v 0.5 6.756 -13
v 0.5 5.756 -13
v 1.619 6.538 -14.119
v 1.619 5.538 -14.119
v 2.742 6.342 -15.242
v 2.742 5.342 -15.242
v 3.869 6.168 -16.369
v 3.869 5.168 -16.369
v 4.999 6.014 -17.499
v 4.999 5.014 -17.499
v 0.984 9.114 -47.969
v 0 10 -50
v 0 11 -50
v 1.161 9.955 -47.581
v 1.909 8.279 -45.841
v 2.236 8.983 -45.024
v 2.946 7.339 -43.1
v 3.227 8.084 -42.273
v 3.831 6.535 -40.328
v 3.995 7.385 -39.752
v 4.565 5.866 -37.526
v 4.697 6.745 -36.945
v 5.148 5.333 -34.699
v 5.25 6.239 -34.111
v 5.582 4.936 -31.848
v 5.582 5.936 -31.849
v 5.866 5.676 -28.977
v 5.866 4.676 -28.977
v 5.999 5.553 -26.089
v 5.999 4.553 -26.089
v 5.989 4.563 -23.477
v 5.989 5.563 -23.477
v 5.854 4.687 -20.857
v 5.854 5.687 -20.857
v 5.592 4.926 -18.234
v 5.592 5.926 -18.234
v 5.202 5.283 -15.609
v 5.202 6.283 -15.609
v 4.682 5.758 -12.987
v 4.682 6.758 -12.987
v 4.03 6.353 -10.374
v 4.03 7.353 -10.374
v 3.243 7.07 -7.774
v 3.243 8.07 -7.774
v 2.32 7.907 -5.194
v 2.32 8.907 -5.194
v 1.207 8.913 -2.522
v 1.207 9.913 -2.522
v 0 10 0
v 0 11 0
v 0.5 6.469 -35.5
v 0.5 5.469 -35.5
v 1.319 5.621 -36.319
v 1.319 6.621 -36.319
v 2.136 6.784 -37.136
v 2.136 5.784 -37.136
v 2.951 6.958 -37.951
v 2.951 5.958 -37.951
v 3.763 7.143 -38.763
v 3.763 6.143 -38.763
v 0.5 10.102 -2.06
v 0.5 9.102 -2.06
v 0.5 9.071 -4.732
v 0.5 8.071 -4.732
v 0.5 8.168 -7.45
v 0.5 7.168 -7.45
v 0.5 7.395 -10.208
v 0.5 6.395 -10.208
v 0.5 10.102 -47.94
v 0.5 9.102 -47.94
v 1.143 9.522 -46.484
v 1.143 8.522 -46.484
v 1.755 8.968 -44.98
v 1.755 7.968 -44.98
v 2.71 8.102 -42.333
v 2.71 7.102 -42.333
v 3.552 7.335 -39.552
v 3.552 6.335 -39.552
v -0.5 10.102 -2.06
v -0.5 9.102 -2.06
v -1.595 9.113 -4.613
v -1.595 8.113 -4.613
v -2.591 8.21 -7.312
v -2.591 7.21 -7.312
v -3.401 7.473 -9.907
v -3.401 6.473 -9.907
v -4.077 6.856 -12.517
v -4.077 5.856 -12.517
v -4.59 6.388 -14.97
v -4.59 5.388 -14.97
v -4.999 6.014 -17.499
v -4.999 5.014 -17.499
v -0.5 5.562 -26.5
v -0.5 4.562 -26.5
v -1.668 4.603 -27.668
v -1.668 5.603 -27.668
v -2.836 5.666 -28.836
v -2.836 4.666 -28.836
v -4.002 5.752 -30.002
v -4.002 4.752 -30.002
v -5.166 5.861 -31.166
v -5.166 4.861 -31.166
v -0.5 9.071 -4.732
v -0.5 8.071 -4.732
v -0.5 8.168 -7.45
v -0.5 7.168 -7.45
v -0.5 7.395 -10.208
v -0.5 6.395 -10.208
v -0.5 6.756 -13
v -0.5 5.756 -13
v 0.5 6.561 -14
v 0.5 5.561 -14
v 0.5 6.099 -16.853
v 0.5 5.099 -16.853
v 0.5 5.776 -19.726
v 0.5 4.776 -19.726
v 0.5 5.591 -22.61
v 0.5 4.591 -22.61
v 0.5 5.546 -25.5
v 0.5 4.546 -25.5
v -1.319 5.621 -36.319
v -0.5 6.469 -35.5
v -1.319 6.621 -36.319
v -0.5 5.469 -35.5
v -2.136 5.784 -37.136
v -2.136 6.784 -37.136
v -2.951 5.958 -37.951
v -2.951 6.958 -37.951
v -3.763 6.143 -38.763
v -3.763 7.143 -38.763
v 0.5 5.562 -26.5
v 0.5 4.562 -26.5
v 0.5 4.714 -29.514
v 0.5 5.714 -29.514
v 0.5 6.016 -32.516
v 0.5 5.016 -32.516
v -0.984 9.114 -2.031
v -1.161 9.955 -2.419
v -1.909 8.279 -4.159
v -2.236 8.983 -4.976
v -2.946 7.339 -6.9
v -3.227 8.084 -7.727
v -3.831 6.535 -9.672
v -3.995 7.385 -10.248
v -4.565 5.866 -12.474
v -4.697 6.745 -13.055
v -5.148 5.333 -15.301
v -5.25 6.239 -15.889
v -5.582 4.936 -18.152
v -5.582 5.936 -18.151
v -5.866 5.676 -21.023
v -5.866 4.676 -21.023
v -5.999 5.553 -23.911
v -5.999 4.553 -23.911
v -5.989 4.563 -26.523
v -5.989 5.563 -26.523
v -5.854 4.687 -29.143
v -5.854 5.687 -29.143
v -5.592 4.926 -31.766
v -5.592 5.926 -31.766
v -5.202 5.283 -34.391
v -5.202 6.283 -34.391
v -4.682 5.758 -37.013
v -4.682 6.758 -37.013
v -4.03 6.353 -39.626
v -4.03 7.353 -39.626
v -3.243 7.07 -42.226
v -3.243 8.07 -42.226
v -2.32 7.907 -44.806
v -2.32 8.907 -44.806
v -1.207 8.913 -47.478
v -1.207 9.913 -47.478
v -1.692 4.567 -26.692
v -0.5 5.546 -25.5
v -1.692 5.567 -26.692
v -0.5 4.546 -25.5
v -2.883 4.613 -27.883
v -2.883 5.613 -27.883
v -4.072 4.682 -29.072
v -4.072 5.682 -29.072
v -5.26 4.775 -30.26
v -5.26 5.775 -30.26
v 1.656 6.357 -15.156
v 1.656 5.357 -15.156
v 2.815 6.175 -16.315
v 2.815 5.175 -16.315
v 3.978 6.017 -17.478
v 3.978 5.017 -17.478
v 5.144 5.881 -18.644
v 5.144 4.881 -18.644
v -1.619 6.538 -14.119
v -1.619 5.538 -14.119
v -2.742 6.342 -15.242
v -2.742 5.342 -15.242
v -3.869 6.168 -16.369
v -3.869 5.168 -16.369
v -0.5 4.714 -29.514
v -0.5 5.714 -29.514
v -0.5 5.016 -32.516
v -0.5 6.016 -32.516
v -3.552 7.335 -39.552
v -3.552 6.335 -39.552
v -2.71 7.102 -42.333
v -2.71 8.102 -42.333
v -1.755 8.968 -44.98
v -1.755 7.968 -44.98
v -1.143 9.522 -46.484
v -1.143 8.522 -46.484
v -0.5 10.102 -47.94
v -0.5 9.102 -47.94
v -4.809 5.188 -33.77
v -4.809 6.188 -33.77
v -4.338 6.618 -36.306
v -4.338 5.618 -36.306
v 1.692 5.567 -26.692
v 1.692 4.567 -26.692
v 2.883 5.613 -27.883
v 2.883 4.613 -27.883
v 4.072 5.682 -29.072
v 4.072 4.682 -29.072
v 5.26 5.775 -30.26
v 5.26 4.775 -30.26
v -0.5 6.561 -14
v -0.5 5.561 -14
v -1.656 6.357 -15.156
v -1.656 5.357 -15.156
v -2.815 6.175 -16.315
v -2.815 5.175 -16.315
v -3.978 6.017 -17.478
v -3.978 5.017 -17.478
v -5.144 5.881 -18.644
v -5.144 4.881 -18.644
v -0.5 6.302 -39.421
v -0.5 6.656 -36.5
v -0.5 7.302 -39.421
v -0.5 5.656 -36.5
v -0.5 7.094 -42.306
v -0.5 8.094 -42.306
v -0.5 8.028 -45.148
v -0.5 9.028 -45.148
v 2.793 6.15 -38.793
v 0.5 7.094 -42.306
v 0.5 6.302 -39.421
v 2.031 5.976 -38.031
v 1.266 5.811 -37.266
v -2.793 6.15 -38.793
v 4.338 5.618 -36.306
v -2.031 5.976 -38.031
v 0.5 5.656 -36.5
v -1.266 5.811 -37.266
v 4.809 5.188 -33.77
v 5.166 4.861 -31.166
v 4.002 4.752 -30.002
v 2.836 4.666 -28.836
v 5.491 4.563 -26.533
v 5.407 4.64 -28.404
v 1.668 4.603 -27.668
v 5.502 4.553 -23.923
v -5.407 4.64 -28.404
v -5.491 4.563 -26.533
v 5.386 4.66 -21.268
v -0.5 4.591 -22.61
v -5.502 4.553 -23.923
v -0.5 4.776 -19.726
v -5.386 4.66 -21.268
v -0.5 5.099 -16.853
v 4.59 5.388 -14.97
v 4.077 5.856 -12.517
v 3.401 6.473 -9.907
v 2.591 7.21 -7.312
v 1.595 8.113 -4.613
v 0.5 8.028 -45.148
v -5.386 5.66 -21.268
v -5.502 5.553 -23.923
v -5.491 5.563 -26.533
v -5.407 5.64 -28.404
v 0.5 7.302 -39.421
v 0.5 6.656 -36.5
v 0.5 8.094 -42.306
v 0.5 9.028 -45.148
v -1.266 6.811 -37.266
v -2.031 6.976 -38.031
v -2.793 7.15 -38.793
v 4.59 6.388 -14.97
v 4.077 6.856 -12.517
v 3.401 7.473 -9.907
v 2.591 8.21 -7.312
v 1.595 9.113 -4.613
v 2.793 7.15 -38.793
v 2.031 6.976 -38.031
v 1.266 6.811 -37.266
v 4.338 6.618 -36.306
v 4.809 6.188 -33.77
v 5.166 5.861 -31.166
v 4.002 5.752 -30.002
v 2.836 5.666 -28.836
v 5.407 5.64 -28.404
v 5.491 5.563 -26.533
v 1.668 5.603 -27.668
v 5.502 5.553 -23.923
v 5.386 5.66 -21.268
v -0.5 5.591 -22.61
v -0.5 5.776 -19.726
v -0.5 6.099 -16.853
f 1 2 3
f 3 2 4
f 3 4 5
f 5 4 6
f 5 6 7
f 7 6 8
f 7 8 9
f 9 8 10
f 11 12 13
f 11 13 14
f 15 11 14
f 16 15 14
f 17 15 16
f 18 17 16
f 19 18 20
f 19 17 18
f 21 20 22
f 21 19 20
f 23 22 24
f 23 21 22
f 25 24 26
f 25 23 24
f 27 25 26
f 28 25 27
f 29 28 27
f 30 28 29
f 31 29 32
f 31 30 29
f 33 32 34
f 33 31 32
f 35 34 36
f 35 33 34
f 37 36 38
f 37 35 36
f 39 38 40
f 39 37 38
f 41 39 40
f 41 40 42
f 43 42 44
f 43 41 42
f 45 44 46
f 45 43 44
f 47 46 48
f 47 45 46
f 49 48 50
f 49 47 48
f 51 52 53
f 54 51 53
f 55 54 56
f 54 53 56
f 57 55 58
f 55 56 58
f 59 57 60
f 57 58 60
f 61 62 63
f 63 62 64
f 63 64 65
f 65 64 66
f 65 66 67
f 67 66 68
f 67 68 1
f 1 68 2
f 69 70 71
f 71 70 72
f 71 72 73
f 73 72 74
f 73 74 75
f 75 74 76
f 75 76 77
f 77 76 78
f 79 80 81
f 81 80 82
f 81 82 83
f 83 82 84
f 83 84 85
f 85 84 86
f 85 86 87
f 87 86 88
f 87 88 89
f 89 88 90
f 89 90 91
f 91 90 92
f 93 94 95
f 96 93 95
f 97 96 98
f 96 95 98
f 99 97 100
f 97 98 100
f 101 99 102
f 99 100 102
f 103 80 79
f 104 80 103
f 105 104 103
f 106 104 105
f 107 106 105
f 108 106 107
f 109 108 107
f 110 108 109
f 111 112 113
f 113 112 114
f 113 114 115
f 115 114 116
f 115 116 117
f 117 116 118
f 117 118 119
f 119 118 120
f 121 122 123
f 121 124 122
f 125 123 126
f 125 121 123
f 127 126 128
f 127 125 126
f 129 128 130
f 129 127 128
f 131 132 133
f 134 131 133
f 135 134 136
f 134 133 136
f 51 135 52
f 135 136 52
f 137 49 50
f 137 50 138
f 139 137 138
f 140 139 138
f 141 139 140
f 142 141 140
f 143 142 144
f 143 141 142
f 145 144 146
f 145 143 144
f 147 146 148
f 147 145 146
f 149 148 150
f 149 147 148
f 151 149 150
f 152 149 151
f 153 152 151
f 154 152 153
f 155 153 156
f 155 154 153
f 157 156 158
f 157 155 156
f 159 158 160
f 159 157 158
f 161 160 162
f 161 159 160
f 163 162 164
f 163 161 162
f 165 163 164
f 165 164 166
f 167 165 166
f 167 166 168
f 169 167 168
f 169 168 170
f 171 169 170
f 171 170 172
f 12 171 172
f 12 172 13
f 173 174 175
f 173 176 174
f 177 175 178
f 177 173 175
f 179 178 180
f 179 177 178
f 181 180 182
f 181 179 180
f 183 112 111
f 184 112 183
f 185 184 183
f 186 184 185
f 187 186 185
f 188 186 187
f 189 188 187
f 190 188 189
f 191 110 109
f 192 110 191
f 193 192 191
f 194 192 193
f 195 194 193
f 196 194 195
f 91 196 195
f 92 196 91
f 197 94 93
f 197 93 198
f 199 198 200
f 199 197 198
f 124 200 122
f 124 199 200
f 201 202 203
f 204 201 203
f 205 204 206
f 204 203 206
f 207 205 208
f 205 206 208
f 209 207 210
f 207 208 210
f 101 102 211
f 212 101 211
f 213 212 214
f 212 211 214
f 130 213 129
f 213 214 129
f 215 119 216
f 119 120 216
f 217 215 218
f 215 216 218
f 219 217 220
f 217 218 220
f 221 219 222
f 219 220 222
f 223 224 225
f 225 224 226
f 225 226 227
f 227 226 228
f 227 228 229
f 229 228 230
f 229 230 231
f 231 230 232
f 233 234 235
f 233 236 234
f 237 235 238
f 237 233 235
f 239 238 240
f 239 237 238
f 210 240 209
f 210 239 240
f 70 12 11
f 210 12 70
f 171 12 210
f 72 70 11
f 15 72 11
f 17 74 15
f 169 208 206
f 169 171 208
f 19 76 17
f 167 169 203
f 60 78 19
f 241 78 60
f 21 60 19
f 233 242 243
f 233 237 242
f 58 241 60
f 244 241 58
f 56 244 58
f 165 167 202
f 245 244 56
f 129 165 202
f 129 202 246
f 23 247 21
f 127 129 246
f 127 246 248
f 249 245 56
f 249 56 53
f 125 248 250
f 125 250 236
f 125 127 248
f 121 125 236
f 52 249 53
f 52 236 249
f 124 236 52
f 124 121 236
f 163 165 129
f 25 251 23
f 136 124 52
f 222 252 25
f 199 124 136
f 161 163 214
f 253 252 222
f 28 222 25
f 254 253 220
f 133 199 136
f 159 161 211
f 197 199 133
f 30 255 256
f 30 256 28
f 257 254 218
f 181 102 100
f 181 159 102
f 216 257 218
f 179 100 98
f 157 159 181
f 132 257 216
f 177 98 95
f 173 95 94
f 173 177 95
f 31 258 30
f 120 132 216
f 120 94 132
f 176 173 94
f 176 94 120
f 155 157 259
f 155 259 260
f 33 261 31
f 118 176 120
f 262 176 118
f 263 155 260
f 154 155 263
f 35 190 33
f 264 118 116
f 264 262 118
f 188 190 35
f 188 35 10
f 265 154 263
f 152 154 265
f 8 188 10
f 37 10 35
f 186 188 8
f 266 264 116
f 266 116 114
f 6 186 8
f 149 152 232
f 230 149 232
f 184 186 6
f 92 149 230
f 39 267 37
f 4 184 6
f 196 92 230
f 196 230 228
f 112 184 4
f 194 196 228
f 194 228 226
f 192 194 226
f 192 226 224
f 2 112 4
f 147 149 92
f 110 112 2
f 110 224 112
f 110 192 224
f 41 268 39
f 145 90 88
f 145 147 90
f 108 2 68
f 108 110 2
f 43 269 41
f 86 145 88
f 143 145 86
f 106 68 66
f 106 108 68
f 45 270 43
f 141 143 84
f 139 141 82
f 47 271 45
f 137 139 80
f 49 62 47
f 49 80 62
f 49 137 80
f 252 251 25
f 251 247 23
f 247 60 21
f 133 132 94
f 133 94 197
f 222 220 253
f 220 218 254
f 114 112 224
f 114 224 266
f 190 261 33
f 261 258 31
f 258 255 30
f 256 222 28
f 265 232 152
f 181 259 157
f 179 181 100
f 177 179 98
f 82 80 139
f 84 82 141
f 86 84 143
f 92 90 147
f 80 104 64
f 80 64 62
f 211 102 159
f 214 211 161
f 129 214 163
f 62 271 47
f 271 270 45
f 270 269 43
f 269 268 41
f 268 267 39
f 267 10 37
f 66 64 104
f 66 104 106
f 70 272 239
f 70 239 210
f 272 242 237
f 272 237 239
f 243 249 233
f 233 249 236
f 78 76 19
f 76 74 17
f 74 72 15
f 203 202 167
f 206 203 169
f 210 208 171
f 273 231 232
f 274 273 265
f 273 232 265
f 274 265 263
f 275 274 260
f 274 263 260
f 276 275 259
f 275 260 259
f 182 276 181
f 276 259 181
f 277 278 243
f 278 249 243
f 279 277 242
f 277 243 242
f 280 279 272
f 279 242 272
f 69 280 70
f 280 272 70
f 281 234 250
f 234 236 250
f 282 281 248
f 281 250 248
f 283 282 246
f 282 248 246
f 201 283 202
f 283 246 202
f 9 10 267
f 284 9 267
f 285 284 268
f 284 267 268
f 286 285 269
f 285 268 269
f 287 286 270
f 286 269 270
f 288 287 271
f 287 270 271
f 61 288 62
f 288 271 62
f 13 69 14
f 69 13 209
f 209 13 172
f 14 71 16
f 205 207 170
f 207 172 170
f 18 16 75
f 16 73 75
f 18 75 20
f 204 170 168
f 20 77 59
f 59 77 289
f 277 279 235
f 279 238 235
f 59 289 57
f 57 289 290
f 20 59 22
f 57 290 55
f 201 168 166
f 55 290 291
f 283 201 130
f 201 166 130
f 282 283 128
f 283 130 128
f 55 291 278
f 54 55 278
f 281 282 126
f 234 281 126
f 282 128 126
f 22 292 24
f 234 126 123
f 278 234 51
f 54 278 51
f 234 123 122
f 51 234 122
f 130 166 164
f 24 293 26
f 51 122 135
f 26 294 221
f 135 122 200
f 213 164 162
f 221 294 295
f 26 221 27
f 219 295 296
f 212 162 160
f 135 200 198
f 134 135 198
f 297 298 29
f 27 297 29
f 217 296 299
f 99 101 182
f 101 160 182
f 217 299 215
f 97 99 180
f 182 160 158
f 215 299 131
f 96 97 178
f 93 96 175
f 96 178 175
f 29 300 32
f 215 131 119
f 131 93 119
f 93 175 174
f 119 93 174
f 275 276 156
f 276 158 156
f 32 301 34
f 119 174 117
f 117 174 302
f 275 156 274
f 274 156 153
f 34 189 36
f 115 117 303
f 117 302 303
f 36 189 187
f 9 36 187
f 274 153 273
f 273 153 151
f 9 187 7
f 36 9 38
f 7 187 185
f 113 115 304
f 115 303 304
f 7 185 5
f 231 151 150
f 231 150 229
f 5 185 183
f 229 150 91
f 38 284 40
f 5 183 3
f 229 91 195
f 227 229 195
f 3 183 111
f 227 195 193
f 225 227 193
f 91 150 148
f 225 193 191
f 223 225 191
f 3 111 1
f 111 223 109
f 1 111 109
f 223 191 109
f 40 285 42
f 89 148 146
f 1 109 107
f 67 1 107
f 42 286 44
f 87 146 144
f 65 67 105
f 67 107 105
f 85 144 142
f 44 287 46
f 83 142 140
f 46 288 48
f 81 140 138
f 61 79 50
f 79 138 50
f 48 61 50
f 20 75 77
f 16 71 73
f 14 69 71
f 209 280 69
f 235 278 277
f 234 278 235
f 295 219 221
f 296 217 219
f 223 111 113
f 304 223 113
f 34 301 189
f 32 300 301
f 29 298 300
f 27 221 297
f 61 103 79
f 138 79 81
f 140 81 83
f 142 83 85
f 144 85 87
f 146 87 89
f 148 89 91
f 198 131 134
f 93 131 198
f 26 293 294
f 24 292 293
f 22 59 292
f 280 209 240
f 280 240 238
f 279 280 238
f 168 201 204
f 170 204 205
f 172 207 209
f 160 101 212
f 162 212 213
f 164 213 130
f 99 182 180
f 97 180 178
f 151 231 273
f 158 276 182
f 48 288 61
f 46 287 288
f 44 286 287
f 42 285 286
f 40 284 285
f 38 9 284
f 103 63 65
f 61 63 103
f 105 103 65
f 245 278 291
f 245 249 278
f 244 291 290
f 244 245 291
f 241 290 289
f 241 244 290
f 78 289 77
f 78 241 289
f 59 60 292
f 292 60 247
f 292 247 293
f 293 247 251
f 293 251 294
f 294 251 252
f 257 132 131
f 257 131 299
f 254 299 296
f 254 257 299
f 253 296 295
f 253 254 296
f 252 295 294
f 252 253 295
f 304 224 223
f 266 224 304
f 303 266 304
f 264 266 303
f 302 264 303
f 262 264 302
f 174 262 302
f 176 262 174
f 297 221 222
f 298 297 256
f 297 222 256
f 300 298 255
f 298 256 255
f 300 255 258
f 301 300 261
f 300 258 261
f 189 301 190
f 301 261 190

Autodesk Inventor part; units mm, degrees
ref_plane "YZ Plane" through (0, 0, 0) normal (1, 0, 0) x (0, 1, 0)
ref_plane "XZ Plane" through (0, 0, 0) normal (0, 1, 0) x (-1, 0, 0)
ref_plane "XY Plane" through (0, 0, 0) normal (0, 0, 1) x (1, 0, 0)
sketch "Sketch1" plane through (0, 0, 0) normal (0, 1, 0) x (-1, 0, 0)
  arc A0 (0, -50) -> (0, 0) centre (-48.9898, -25) ccw
  arc A1 (0, -49) -> (0, -1) centre (-49.4874, -25) ccw
  line L0 (0, 0) -> (0, -50)
  line L1 (0, -12.5) -> (5.5721, -18.0721)
  line L2 (0, -12.5) -> (7.8802, -12.5) construction
  line L3 (0, -13.5) -> (5.704, -19.204)
  line L4 (0, -25) -> (5.7127, -30.7127)
  line L5 (0, -25) -> (8.079, -25) construction
  line L6 (0, -26) -> (5.6114, -31.6114)
  line L7 (0, -35) -> (4.157, -39.157)
  line L8 (0, -35) -> (5.8789, -35) construction
  line L9 (0, -36) -> (3.9417, -39.9417)
  arc A2 (0, 0) -> (0, -50) centre (48.9898, -25) ccw
  arc A3 (0, -1) -> (0, -49) centre (49.4874, -25) ccw
  line L10 (0, -12.5) -> (-5.5721, -18.0721)
  line L11 (0, -13.5) -> (-5.704, -19.204)
  line L12 (0, -25) -> (-5.7127, -30.7127)
  line L13 (0, -26) -> (-5.6114, -31.6114)
  line L14 (0, -35) -> (-4.157, -39.157)
  line L15 (0, -36) -> (-3.9417, -39.9417)
  line L16 (0.5, 0) -> (0.5, -50.0047)
  line L17 (-0.5, 0) -> (-0.5, -50.0047)
  point P0 (5.1659, -31.1659)
  point P1 (3.7628, -38.7628)
  point P2 (0.5, -35.5)
  point P3 (0.5, -26.5)
  point P4 (-3.7628, -38.7628)
  point P5 (-5.1659, -31.1659)
  point P6 (-0.5, -26.5)
  point P7 (-0.5, -35.5)
  point P8 (-5.2605, -30.2605)
  point P9 (-5.1441, -18.6441)
  point P10 (-0.5, -14)
  point P11 (-0.5, -25.5)
  point P12 (-4.9987, -17.4987)
  point P13 (-0.5, -2.0596)
  point P14 (-0.5, -13)
  point P15 (-0.5, -36.5)
  point P16 (-0.5, -47.9404)
  point P17 (-3.5525, -39.5525)
  point P18 (4.9987, -17.4987)
  point P19 (0.5, -13)
  point P20 (0.5, -2.0596)
  point P21 (3.5525, -39.5525)
  point P22 (0.5, -47.9404)
  point P23 (0.5, -36.5)
  point P24 (5.1441, -18.6441)
  point P25 (5.2605, -30.2605)
  point P26 (0.5, -25.5)
  point P27 (0.5, -14)
  dimension "d0" = 50
  dimension "d1" = 55
  dimension "d2" = 48
  dimension "d3" = 55
  dimension "d4" = 45
  dimension "d5" = 45
  dimension "d6" = 45
extrude "Extrusion1" add sketch "Sketch1" along normal blind 20 contours L9 A1 L7 A0 | A0 L16 A1 L9 | L7 A1 L6 A0 | A0 L0 A1 L16 | L9 L16 L7 A1 | L6 A1 L4 A0 | A2 L17 A3 L0 | A1 L0 L9 L16 | L9 L0 L7 L16 | L4 A1 L3 A0 | L6 L16 L4 A1 | L7 L0 L6 L16 | A3 L17 L15 L0 | A2 L15 A3 L17 | L15 L17 L14 L0 | L3 A1 L1 A0 | L6 L0 L4 L16 | L14 L17 L13 L0 | A2 L14 A3 L15 | L15 A3 L14 L17 | L1 A1 L16 A0 | L3 L16 L1 A1 | L4 L0 L3 L16 | L13 L17 L12 L0 | A2 L13 A3 L14 | L16 A1 L0 A0 | L3 L0 L1 L16 | L12 L17 L11 L0 | L13 A3 L12 L17 | A2 L12 A3 L13 | L0 A3 L17 A2 | L16 L1 L0 A1 | L11 L17 L10 L0 | A2 L11 A3 L12 | L0 L10 L17 A3 | L17 A3 L10 A2 | L11 A3 L10 L17 | A2 L10 A3 L11
sketch "Sketch2" plane through (0, 0, 0) normal (0, 0, 1) x (1, 0, 0)
  point P0 (0, 0)
sketch "Sketch3" plane through (0, 0, 0) normal (1, 0, 0) x (0, 1, 0)
  line L0 (0, 0) -> (20, 0) projected
  line L1 (0, -50) -> (20, -50) projected
  arc A0 (10, 0) -> (10, -50) centre (64.5436, -25) ccw
  arc A1 (11, 0) -> (11, -50) centre (65.5436, -25) ccw
  line L2 (11, 0) -> (11, -50) construction
  line L3 (11, 0) -> (61, 0) construction
  line L4 (11, 0) -> (20, 0)
  line L5 (20, -50) -> (20, 0) projected
  line L6 (20, 0) -> (20, -50)
  line L7 (20, -50) -> (11, -50)
  line L8 (10, 0) -> (0, 0)
  line L9 (0, 0) -> (0, -50)
  line L10 (10, -50) -> (0, -50)
  point P0 (11, 0)
  point P1 (11, -50)
  dimension "d9" = 60
  dimension "d10" = 50
  dimension "d11" = 90
  dimension "d12" = 60
extrude "Extrusion2" cut sketch "Sketch3" along normal mid plane 20 contours L0 A0 L1 L9 | L0 L5 L1 A1
